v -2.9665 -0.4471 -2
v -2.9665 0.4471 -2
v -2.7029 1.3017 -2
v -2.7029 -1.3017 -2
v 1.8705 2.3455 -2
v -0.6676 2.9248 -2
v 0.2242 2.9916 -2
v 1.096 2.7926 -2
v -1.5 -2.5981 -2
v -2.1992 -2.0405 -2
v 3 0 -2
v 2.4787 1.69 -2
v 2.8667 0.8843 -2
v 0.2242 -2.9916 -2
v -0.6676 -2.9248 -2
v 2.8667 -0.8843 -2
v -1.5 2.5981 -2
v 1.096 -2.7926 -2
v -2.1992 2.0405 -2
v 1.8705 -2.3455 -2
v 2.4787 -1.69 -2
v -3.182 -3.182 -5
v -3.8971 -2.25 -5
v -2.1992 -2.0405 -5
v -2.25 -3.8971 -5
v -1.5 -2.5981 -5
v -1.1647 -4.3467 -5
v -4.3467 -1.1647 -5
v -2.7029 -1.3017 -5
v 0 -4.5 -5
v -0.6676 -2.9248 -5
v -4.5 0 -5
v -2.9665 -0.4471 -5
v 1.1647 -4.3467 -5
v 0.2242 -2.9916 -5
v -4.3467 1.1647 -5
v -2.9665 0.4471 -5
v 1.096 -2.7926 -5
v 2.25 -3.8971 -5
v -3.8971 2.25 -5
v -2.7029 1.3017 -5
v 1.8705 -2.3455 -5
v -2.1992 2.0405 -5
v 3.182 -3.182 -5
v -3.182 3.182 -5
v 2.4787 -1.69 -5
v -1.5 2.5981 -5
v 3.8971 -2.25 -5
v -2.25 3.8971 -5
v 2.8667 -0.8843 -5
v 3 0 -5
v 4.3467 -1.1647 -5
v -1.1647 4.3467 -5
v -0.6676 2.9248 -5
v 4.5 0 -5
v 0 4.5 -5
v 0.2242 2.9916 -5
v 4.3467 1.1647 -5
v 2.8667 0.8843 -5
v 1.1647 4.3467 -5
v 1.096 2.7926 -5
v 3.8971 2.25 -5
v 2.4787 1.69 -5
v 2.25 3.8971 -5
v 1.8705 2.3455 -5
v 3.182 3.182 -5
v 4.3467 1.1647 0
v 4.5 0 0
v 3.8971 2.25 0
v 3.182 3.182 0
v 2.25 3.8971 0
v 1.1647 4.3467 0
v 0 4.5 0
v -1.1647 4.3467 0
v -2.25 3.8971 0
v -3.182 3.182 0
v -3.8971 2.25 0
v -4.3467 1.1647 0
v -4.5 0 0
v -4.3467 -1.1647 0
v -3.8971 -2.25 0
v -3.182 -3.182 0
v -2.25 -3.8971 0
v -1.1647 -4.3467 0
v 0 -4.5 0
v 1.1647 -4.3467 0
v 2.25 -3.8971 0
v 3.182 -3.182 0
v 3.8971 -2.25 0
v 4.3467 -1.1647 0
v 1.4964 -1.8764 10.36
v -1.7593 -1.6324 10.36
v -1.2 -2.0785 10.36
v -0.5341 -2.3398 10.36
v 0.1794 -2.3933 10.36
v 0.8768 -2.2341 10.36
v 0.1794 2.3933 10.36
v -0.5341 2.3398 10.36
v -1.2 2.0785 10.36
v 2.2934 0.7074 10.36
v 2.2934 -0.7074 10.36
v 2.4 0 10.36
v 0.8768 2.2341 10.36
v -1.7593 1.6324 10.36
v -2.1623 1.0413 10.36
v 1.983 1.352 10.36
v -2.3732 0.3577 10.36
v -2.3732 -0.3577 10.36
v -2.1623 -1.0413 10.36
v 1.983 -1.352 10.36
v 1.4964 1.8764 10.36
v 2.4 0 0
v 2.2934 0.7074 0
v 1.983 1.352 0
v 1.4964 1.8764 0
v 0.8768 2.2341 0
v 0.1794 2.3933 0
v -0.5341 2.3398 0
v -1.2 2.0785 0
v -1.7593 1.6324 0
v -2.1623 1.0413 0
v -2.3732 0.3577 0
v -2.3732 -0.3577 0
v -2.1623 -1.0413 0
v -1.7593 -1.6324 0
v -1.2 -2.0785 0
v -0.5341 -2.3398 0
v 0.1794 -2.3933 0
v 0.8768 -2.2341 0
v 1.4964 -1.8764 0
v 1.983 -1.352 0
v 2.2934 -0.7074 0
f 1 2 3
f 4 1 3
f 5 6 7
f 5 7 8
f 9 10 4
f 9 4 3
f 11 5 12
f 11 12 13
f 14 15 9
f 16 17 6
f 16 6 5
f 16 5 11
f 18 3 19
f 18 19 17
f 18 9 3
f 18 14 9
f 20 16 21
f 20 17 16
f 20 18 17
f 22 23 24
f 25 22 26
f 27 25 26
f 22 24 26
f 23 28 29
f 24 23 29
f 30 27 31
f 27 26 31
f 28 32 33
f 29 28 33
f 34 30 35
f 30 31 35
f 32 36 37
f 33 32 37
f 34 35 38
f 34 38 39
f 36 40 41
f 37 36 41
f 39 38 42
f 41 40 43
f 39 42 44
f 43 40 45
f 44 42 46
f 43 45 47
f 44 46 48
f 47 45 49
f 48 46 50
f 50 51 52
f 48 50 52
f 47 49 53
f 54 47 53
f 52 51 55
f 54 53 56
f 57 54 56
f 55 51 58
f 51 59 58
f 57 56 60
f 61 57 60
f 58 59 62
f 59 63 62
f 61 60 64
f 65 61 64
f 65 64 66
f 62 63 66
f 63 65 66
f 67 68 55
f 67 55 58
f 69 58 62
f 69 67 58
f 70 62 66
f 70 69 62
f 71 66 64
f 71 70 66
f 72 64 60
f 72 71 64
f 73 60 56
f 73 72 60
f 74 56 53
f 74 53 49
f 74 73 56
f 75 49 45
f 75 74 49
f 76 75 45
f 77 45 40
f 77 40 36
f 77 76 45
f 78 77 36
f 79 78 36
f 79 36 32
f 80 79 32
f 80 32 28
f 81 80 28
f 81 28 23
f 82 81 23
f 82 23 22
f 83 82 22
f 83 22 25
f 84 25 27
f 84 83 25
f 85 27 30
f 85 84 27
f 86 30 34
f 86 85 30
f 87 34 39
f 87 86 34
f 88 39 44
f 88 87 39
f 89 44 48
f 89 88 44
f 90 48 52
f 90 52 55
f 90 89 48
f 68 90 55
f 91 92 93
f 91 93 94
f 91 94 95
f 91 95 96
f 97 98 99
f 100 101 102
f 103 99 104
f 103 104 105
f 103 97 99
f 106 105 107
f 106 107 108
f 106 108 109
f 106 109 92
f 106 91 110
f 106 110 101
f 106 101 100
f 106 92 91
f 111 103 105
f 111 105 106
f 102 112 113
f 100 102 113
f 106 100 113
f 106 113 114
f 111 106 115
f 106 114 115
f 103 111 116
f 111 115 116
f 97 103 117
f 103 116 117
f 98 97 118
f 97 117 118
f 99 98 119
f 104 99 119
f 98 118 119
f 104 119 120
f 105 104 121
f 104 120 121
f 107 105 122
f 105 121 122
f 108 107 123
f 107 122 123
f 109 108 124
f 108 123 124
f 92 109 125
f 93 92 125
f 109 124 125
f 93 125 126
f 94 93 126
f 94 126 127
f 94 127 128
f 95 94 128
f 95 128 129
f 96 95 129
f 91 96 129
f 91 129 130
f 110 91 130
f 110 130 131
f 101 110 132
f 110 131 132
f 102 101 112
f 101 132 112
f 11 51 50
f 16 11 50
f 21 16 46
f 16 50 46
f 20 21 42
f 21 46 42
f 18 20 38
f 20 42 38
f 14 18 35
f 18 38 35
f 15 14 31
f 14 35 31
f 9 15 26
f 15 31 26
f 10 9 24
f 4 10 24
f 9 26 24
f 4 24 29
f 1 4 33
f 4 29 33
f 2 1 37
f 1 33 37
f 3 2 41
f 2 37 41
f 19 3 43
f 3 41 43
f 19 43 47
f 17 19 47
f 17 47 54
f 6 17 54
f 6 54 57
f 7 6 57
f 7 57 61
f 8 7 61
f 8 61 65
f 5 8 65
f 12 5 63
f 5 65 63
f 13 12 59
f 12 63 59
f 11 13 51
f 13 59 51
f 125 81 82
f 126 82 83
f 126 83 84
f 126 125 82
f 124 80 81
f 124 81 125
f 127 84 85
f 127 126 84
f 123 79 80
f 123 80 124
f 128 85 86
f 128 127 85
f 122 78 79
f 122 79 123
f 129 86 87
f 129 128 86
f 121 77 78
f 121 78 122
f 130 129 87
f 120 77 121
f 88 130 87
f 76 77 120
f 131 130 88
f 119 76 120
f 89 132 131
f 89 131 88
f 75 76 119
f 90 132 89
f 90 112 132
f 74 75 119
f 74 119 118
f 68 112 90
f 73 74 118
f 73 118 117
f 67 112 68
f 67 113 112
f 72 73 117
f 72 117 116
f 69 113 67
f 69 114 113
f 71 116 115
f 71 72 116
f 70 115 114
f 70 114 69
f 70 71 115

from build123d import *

# Parameters (mm, degrees)
F0_R      = 2.4
F1_DEPTH  = 10.36
F0_R_2    = 4.5
F1_FACE_R = 2.4
F2_DEPTH  = 5
F3_R      = 3
F4_DEPTH  = 3


with BuildPart() as f1:
    # F0 (on Top) → F1 (new body)
    with BuildSketch(Plane.XY):
        Circle(F0_R)
    extrude(amount=F1_DEPTH)

    # F0 (on Top) + F1_face (on face) → F2 (join)
    with BuildSketch(Plane.XY):
        Circle(F0_R_2)
        Circle(F0_R, mode=Mode.SUBTRACT)
    with BuildSketch(Plane(origin=(0, 0, 0), x_dir=(1, 0, 0), z_dir=(0, 0, -1))):
        Circle(F1_FACE_R)
    extrude(amount=-F2_DEPTH, dir=(0, 0, 1))

    # F3 (on face) → F4 (cut)
    with BuildSketch(Plane(origin=(0, 0, -5), x_dir=(1, 0, 0), z_dir=(0, 0, -1))):
        Circle(F3_R)
    extrude(amount=-F4_DEPTH, mode=Mode.SUBTRACT)


solid = f1.part
